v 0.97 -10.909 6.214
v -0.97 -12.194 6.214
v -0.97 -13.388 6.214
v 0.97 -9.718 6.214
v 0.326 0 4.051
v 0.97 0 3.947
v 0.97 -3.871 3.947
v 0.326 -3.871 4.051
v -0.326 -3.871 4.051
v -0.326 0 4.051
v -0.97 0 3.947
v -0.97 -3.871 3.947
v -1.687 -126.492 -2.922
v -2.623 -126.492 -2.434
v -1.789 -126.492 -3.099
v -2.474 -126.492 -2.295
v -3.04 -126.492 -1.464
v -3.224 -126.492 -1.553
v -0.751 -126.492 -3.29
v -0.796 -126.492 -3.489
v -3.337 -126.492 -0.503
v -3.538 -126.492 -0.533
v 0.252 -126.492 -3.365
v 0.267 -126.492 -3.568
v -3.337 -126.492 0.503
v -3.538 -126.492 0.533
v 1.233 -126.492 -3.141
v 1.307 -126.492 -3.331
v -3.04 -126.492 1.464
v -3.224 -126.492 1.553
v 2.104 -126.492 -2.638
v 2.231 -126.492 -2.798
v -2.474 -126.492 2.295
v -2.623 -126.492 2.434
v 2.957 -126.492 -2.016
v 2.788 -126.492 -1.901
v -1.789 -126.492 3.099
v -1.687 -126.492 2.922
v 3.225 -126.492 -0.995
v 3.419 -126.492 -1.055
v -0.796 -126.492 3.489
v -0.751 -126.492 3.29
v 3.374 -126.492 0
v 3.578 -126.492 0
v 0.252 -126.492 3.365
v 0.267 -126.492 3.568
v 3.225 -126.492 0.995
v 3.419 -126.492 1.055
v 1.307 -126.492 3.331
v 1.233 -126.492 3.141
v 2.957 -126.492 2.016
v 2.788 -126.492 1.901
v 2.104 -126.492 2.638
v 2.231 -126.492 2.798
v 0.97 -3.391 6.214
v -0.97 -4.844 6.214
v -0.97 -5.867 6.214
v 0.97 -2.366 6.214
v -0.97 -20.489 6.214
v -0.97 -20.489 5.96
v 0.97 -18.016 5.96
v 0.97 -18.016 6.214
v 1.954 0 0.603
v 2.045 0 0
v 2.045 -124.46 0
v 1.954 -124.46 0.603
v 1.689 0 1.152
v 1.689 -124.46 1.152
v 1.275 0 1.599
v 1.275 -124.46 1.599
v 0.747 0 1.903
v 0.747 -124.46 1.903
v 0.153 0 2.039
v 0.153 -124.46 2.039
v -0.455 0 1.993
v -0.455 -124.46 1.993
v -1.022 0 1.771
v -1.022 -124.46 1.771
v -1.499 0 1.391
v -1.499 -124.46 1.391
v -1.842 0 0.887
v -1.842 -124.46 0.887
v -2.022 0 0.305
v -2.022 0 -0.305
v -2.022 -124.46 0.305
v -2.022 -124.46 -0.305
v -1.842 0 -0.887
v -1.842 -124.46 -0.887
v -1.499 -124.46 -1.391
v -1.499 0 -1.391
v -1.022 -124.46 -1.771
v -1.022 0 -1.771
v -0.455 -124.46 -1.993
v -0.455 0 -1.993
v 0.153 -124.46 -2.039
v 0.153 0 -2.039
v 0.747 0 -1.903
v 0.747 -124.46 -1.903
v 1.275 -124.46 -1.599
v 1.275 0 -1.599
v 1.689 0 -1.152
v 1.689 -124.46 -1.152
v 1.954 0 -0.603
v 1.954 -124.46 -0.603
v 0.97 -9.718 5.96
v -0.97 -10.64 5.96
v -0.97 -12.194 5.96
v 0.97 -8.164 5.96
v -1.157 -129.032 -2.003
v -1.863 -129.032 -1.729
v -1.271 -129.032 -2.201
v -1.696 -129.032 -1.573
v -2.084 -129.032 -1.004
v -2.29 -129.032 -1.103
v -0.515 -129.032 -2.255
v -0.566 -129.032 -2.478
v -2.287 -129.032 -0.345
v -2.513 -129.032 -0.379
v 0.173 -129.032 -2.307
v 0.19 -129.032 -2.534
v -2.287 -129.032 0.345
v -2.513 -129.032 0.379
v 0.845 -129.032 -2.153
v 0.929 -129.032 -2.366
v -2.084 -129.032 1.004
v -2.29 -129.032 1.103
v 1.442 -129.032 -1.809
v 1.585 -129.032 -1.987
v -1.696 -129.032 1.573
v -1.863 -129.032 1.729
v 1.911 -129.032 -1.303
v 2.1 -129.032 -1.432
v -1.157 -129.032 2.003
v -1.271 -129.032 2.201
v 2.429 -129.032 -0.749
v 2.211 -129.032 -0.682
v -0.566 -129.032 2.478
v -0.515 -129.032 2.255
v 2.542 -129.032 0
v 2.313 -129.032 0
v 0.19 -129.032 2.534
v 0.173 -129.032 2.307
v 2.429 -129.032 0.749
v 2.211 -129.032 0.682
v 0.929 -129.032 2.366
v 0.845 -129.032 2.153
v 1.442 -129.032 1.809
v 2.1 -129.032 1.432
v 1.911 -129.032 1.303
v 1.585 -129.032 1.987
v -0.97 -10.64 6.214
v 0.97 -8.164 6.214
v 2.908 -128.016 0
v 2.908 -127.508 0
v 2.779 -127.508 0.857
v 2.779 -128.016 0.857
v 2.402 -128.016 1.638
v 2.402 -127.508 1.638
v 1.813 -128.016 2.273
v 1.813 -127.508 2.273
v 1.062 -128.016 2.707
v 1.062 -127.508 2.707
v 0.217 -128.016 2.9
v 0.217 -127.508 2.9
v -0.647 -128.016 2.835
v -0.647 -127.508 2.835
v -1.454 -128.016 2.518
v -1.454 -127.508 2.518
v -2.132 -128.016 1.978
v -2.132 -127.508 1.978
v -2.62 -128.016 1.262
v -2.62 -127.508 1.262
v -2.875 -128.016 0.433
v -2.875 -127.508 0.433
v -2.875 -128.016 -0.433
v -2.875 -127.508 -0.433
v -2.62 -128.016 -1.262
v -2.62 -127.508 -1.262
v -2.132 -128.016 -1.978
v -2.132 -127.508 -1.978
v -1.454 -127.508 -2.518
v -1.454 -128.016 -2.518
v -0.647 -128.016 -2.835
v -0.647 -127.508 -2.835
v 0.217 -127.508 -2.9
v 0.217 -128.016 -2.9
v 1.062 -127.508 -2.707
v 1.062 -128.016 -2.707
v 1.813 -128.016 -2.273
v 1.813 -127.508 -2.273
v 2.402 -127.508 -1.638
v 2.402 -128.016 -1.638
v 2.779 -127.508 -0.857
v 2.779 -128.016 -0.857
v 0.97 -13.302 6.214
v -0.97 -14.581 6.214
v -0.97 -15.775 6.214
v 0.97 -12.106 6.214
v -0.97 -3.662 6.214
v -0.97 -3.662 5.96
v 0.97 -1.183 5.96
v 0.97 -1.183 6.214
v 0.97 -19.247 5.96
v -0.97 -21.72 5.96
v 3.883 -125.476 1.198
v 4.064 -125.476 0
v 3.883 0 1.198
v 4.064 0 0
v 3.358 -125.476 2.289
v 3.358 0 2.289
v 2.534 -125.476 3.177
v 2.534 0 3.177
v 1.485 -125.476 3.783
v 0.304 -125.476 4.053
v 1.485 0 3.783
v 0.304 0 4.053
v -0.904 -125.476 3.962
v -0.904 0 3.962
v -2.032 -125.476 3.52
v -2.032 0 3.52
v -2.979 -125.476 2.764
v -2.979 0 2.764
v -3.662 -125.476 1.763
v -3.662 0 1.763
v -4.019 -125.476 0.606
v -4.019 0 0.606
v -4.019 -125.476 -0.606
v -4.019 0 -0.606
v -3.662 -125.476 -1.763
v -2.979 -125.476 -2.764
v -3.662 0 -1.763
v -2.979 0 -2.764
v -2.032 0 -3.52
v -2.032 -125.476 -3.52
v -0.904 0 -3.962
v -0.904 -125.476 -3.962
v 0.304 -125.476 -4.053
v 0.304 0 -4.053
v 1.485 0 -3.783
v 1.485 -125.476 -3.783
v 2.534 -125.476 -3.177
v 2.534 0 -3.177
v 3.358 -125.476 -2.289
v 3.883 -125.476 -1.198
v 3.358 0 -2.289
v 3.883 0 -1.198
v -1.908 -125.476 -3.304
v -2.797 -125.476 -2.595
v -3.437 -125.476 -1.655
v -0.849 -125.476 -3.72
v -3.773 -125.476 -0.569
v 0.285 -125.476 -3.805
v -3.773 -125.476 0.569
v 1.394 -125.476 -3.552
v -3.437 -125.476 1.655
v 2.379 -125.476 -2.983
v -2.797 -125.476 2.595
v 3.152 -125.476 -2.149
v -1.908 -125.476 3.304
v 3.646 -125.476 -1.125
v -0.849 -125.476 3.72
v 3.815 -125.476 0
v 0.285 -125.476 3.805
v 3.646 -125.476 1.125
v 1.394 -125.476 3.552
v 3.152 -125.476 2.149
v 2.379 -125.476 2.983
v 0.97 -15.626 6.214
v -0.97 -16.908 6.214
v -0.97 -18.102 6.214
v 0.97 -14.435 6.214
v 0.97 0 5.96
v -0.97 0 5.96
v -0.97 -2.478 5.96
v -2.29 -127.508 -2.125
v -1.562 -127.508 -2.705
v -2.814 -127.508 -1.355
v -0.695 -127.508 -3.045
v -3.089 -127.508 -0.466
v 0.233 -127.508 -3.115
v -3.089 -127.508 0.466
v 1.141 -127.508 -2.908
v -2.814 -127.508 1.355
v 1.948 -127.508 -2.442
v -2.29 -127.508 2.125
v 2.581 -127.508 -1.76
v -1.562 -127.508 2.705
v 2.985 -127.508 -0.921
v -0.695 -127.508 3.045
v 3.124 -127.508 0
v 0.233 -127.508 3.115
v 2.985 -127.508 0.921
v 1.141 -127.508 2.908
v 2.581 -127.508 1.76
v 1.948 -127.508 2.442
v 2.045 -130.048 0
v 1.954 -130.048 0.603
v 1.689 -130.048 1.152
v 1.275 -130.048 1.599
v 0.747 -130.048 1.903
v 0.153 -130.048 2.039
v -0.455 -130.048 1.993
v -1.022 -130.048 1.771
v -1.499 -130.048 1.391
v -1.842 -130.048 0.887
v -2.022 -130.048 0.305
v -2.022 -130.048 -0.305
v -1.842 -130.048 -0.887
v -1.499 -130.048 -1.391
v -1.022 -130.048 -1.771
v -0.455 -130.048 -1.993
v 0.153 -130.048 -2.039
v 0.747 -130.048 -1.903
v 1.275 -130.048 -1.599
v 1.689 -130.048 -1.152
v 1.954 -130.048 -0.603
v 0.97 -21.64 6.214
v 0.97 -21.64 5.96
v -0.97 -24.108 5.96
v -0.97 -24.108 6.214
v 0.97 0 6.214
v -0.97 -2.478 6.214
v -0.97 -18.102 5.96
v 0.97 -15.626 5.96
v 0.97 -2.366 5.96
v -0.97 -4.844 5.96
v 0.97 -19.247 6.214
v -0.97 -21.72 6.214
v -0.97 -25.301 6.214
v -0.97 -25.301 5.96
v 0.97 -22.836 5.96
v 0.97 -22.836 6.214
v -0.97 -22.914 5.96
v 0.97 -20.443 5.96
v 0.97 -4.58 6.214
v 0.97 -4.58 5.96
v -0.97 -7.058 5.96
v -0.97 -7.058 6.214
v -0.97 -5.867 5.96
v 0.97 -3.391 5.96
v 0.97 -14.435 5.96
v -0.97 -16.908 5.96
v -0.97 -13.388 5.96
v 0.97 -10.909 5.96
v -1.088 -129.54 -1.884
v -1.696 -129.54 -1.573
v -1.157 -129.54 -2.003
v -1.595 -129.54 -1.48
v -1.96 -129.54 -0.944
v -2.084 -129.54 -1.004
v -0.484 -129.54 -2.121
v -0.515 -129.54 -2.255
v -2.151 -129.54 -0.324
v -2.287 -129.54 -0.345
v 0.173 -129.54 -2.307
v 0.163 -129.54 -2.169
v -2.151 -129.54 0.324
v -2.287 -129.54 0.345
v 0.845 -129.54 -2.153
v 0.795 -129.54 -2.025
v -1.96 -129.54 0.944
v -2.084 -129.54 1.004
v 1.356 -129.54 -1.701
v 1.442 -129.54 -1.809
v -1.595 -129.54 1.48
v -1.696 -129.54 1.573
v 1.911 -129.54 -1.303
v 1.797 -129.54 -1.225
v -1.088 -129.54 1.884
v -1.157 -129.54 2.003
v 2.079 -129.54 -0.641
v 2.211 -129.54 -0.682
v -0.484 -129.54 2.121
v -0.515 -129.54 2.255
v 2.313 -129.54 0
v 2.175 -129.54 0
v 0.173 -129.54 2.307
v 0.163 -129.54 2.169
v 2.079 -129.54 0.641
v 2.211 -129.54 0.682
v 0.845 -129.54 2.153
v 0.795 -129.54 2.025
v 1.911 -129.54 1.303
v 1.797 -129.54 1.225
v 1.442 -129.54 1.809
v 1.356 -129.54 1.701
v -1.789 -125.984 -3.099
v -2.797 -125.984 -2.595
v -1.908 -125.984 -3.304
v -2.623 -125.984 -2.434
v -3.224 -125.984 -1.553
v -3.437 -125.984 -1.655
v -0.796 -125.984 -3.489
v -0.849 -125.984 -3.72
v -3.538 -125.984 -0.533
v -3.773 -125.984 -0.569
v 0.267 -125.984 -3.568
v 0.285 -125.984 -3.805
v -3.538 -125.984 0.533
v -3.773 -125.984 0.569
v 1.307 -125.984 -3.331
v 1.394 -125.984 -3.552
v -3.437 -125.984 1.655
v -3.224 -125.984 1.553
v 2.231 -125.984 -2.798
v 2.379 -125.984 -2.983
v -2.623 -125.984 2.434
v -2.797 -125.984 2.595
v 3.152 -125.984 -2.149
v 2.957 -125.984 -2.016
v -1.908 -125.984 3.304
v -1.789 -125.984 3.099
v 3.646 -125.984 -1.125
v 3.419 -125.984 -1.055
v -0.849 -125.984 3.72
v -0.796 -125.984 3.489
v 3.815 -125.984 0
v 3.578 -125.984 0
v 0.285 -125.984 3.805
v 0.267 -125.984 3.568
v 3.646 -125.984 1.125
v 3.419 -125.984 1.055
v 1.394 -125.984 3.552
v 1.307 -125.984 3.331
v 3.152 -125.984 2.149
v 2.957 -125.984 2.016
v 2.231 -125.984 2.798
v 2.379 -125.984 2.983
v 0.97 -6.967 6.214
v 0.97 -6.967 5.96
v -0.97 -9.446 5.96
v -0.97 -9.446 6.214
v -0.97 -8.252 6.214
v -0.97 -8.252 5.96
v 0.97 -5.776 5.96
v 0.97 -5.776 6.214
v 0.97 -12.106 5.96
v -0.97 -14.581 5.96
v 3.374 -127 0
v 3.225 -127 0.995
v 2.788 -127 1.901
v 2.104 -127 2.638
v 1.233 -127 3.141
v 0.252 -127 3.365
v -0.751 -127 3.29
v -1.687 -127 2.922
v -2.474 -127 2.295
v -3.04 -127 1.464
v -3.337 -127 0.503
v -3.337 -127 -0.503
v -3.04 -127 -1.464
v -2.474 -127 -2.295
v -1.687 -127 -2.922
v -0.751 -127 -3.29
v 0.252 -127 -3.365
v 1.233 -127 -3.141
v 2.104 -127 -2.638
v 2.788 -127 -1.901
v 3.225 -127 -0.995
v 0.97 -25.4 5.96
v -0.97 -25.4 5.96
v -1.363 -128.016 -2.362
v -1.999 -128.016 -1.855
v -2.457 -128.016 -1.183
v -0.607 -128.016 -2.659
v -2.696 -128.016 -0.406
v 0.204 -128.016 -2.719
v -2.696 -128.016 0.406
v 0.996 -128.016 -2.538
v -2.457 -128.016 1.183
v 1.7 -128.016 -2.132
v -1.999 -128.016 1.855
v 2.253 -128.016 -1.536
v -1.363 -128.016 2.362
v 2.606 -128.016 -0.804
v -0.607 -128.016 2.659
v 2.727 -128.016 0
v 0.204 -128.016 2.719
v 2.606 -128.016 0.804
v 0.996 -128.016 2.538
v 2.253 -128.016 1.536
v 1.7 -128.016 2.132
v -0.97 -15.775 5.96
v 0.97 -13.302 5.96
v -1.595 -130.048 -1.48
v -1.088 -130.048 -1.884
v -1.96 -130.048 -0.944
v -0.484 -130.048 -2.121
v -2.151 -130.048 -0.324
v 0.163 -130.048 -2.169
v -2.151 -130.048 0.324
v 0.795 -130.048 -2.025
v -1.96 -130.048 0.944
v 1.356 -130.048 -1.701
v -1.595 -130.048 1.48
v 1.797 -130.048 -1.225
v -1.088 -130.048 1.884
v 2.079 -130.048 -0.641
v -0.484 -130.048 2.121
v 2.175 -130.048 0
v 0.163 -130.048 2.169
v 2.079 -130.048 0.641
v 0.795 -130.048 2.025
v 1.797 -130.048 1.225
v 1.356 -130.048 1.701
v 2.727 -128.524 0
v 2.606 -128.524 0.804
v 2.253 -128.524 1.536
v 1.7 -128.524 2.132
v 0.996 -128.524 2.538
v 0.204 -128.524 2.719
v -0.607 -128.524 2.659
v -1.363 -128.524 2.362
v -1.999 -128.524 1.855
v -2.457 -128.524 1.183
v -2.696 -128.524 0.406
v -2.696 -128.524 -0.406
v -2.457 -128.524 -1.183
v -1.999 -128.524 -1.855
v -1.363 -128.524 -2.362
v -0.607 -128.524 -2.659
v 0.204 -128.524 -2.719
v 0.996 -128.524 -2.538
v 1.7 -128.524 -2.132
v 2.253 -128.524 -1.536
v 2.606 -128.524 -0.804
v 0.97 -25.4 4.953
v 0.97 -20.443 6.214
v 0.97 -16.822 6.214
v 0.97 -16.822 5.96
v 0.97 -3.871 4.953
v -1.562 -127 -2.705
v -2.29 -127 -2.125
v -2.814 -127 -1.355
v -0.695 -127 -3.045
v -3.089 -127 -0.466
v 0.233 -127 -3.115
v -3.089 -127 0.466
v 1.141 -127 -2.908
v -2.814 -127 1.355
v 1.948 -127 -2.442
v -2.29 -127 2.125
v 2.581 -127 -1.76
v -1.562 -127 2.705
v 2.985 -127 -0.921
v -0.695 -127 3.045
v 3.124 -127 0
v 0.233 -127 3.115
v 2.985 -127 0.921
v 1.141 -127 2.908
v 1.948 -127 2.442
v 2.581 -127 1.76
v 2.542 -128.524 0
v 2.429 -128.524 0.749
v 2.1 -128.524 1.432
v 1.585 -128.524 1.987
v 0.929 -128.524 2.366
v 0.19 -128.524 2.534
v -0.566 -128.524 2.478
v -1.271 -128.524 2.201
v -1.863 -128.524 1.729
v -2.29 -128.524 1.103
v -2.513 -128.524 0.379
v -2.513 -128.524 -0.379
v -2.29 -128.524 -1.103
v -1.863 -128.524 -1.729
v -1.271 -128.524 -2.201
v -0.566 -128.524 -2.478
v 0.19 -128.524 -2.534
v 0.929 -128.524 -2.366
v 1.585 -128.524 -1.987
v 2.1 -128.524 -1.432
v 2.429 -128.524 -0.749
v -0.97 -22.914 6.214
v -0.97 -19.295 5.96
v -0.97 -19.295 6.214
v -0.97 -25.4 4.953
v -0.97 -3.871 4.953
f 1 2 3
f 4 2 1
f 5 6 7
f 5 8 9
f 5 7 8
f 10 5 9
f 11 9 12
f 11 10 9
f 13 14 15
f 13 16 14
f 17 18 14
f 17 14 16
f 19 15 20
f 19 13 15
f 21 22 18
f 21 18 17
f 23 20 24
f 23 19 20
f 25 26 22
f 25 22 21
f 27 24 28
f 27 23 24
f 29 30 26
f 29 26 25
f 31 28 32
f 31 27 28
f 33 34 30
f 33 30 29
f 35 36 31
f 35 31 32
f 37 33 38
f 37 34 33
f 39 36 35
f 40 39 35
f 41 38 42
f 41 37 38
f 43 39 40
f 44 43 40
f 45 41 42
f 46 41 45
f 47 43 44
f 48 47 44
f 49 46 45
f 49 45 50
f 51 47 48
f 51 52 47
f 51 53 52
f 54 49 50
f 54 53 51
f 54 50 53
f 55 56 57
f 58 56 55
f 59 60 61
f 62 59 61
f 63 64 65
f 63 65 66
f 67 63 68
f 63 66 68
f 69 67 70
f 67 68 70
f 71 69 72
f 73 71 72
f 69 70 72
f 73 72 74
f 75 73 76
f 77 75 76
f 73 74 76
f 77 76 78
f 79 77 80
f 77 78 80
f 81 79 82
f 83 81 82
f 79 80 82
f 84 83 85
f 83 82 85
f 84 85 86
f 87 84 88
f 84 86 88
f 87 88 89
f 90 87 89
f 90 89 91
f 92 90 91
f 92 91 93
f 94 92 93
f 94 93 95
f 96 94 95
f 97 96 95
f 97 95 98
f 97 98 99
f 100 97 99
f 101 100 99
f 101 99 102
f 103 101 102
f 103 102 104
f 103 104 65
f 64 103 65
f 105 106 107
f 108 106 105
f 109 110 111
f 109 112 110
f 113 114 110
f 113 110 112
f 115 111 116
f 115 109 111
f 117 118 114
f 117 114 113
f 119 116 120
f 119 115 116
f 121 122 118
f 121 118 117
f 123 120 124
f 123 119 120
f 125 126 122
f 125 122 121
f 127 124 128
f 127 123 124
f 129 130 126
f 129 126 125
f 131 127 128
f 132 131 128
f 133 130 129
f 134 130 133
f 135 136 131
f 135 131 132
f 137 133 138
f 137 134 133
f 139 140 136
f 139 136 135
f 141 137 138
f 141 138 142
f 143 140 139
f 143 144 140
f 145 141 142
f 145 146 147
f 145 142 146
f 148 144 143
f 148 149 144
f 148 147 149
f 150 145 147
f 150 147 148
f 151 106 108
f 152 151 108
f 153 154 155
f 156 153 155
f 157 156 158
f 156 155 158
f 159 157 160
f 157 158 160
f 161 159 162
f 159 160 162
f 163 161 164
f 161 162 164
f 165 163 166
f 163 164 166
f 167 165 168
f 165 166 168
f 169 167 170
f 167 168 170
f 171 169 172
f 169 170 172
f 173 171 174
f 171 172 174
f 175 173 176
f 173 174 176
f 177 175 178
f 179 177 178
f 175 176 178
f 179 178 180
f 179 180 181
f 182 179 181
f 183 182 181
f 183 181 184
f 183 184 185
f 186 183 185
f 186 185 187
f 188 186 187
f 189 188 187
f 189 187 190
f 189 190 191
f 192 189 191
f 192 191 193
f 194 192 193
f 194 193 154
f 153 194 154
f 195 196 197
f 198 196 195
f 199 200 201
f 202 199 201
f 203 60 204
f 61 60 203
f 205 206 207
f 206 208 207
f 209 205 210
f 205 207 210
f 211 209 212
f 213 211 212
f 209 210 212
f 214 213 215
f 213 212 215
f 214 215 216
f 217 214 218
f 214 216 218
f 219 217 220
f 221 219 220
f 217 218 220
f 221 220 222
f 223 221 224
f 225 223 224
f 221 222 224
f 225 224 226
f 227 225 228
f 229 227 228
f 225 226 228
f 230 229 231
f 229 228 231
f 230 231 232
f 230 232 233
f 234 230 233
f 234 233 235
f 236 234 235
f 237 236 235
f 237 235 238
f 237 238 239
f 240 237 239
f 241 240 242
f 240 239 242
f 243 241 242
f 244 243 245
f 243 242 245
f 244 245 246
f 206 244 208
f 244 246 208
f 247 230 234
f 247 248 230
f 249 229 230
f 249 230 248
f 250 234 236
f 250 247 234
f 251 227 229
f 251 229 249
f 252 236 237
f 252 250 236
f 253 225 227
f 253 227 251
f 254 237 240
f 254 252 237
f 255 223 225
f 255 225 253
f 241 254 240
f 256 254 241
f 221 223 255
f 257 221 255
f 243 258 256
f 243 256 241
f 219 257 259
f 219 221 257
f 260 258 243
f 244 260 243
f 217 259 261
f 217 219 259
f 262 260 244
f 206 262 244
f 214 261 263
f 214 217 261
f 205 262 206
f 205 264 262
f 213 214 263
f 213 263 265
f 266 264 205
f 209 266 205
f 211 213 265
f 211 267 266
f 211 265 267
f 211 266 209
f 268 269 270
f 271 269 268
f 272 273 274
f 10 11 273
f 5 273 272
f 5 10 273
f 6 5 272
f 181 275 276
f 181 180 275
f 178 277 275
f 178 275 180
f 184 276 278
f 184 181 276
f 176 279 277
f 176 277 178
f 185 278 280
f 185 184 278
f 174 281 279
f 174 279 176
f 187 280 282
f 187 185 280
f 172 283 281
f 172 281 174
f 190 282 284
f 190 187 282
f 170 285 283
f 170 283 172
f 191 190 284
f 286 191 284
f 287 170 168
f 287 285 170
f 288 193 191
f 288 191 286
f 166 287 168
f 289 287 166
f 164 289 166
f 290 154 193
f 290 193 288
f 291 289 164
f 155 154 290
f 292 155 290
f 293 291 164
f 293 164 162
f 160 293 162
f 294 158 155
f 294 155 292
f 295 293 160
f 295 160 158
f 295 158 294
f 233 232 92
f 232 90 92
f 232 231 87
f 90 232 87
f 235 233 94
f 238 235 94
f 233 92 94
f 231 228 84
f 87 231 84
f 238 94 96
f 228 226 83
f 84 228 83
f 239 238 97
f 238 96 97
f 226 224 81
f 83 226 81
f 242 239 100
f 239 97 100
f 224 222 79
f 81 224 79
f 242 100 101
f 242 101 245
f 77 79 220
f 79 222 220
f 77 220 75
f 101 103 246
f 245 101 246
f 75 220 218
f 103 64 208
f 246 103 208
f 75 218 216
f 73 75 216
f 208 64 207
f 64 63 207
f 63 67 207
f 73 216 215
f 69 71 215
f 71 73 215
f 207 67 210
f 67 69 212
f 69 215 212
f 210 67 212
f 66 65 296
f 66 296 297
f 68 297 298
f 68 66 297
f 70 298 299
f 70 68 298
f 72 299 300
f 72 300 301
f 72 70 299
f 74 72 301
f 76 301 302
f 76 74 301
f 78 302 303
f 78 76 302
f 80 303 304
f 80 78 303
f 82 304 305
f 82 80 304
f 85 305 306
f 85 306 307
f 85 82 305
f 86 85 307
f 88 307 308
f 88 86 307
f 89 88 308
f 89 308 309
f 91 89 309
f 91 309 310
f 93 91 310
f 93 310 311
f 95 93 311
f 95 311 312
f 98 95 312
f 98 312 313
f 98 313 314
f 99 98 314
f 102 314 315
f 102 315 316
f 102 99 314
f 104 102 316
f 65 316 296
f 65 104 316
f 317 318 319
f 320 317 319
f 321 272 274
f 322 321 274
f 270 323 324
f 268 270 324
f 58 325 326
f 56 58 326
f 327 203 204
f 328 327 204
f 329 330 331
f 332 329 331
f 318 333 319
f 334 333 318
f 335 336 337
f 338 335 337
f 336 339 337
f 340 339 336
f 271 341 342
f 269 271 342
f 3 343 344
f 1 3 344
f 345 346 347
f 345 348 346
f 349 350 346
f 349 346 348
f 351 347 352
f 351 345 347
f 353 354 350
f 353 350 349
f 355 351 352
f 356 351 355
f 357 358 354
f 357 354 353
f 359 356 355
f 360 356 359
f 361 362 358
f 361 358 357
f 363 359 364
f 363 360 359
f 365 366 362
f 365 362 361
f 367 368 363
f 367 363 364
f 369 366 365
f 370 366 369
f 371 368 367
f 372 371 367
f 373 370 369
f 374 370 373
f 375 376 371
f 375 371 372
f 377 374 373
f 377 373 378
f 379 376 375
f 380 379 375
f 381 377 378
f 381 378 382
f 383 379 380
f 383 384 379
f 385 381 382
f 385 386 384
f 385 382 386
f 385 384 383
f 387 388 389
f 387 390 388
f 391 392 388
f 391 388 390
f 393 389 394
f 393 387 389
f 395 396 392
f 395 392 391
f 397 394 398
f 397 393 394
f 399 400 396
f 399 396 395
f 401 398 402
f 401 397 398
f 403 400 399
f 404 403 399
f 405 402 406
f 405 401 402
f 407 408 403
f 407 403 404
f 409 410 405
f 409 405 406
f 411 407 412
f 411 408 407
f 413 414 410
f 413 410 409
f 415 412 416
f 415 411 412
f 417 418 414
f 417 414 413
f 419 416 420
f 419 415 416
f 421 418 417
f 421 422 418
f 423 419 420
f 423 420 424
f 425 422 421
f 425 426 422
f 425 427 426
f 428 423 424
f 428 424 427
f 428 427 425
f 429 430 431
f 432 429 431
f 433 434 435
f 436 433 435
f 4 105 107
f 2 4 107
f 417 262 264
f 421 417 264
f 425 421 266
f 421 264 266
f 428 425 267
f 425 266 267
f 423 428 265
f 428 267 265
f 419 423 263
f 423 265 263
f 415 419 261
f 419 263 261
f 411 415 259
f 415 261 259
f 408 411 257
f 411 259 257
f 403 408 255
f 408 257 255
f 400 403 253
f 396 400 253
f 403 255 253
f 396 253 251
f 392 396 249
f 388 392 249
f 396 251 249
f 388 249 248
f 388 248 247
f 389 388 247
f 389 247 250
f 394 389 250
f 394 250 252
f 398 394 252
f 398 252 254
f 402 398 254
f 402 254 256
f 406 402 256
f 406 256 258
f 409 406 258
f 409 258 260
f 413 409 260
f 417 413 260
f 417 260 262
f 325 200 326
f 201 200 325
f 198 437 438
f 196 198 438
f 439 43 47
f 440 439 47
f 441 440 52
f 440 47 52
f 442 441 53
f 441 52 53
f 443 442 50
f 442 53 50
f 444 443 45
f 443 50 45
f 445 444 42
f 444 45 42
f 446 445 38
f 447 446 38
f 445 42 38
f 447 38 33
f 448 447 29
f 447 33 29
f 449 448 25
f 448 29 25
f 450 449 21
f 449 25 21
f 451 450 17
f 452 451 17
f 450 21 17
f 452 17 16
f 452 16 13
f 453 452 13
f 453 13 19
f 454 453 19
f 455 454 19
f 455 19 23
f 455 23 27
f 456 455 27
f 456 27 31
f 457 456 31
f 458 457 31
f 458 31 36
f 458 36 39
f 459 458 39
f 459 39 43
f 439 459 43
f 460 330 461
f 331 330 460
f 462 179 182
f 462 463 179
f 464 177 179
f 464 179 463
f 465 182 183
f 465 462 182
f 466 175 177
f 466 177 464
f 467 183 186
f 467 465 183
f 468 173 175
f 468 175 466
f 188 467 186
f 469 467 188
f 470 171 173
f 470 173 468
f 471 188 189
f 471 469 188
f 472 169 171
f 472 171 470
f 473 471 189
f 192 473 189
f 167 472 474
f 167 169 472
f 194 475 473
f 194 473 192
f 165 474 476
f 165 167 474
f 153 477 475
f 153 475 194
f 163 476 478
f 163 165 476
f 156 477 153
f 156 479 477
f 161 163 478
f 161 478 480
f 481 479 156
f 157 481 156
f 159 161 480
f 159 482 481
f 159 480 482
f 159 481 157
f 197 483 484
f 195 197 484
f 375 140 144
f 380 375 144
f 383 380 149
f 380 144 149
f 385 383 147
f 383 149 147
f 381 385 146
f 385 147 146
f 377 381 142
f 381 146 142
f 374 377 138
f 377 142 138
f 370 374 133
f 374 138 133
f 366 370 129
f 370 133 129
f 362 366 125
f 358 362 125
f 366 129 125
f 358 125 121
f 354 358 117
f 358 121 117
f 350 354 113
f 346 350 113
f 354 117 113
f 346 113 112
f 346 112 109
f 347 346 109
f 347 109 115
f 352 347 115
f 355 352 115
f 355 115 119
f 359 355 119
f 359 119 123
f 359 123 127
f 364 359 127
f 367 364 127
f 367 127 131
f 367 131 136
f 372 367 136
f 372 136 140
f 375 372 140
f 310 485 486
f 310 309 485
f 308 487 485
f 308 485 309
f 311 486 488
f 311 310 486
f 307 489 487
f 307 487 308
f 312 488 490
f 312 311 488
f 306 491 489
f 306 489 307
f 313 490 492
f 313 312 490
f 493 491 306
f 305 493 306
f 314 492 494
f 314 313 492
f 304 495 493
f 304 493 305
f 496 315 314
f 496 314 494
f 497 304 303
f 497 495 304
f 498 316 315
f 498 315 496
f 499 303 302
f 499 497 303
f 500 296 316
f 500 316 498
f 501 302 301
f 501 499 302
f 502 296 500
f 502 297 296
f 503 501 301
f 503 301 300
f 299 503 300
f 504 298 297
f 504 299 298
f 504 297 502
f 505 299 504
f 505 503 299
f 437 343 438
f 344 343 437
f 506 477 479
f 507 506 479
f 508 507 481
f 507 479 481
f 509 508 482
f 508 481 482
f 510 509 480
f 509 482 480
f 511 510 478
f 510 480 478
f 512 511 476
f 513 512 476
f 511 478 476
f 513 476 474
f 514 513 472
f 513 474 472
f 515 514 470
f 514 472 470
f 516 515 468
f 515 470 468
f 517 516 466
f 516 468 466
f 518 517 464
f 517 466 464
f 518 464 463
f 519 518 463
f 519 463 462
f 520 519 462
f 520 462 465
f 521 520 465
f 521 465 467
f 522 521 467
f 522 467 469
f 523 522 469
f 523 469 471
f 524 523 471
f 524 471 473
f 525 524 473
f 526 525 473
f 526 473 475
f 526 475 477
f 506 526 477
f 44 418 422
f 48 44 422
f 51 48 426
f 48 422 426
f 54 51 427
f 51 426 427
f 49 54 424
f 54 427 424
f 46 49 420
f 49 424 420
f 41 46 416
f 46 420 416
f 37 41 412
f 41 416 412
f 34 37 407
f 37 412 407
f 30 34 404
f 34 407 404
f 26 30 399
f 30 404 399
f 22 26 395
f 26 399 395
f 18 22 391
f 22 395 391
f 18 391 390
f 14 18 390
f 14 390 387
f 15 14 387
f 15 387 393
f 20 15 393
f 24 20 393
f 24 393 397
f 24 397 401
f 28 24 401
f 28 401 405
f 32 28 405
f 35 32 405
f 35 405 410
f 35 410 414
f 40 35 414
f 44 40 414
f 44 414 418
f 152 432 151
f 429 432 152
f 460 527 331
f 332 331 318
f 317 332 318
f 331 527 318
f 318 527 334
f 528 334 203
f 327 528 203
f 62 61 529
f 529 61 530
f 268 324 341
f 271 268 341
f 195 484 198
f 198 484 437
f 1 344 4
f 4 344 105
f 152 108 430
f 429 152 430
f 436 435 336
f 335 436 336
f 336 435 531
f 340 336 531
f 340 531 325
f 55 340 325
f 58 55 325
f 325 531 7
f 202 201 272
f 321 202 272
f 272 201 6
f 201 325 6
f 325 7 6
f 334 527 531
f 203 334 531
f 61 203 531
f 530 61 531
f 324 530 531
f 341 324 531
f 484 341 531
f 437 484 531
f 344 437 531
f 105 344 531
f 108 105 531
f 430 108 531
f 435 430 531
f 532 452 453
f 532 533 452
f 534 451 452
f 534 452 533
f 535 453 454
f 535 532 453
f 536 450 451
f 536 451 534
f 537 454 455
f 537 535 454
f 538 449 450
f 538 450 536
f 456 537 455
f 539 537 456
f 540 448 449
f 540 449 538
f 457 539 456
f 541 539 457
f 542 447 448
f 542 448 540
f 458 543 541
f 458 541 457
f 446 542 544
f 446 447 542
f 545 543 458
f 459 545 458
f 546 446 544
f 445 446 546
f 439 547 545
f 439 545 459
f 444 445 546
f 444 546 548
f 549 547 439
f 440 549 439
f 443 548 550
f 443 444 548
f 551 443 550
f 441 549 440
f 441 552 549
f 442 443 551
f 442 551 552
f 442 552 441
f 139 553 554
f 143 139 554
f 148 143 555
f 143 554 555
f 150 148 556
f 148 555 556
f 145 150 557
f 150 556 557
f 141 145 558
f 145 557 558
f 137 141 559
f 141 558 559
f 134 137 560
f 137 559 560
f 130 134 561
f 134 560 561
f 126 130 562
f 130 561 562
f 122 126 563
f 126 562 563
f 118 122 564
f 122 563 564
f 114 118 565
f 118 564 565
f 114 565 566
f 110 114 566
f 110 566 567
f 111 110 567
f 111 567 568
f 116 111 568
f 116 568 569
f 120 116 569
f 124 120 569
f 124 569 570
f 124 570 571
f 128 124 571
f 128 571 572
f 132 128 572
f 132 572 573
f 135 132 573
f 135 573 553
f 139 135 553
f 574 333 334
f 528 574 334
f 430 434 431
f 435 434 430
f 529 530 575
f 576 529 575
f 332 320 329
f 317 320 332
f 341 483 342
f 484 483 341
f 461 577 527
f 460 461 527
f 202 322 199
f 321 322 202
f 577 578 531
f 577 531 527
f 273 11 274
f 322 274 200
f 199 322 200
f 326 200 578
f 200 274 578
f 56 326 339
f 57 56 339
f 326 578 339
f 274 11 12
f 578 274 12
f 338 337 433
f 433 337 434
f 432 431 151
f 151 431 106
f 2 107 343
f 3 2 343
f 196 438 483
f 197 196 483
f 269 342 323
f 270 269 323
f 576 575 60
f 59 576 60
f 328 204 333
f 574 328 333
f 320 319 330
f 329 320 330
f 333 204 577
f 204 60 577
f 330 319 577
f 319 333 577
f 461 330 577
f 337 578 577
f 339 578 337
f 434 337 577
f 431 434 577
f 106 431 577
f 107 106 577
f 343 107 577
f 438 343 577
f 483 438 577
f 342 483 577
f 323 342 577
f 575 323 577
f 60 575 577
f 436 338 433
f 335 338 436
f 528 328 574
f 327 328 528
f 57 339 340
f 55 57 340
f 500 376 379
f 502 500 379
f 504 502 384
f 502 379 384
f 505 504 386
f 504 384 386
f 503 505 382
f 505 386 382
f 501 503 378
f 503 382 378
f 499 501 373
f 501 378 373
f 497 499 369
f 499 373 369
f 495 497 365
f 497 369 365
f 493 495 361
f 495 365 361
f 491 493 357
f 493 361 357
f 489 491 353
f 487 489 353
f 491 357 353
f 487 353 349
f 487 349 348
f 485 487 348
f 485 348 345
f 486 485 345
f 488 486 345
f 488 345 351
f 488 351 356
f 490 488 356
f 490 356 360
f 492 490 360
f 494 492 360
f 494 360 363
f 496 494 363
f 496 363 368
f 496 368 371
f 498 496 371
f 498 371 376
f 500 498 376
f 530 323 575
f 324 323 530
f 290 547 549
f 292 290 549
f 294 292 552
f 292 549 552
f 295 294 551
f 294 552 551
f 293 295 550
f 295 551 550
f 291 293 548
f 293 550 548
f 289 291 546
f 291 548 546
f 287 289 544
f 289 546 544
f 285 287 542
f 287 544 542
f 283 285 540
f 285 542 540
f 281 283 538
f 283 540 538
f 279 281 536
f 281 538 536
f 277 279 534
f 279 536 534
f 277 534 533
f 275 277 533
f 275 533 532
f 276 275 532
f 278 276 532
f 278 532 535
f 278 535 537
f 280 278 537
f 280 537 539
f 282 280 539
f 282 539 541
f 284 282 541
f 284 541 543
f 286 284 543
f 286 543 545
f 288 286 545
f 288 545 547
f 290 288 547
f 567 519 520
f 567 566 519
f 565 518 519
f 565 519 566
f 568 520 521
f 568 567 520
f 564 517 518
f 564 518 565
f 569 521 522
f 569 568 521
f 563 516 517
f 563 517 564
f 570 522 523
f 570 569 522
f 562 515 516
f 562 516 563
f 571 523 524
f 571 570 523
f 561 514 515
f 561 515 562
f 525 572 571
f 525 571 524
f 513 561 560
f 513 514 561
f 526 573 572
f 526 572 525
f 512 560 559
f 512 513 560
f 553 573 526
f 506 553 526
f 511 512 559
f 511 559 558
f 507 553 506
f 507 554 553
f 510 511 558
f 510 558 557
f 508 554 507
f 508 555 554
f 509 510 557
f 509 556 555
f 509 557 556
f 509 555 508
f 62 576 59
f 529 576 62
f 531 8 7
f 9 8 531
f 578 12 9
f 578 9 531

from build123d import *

# Parameters (mm, degrees)
F0_R      = 4.064
F1_DEPTH  = 124.46
F2_R      = 2.0447
F3_DEPTH  = 124.461
F4_R      = 4.064
F4_R_2    = 3.8152332724
F5_DEPTH  = 1.016
F4_R_3    = 3.5783205967
F6_DEPTH  = 1.524
F4_R_4    = 3.374484348
F7_DEPTH  = 2.032
F4_R_5    = 3.1236204278
F8_DEPTH  = 2.54
F4_R_6    = 2.9077299751
F9_DEPTH  = 3.048
F4_R_7    = 2.7268965776
F10_DEPTH = 3.556
F4_R_8    = 2.5416004055
F11_DEPTH = 4.064
F4_R_9    = 2.3133155835
F12_DEPTH = 4.572
F4_R_10   = 2.1752144811
F13_DEPTH = 5.08
F14_DEPTH = 5.588
F16_DEPTH = 25.4
F17_DEPTH = 0.762
F18_W     = 21.5292948574
F18_H     = 1.006477682
F19_DEPTH = 25.4
F21_DEPTH = 0.254


with BuildPart() as f1:
    # F0 (on Front) → F1 (new body)
    with BuildSketch(Plane.XZ):
        Circle(F0_R)
    extrude(amount=F1_DEPTH)

    # F2 (on face) → F3 (cut, through all)
    with BuildSketch(Plane.XZ.offset(124.46)):
        Circle(F2_R)
    extrude(amount=-F3_DEPTH, mode=Mode.SUBTRACT)

    # F4 (on face) → F5 (join)
    with BuildSketch(Plane.XZ.offset(124.46)):
        Circle(F4_R)
        Circle(F4_R_2, mode=Mode.SUBTRACT)
    extrude(amount=F5_DEPTH)

    # F4 (on face) → F6 (join)
    with BuildSketch(Plane.XZ.offset(124.46)):
        Circle(F4_R_2)
        Circle(F4_R_3, mode=Mode.SUBTRACT)
    extrude(amount=F6_DEPTH)

    # F4 (on face) → F7 (join)
    with BuildSketch(Plane.XZ.offset(124.46)):
        Circle(F4_R_3)
        Circle(F4_R_4, mode=Mode.SUBTRACT)
    extrude(amount=F7_DEPTH)

    # F4 (on face) → F8 (join)
    with BuildSketch(Plane.XZ.offset(124.46)):
        Circle(F4_R_4)
        Circle(F4_R_5, mode=Mode.SUBTRACT)
    extrude(amount=F8_DEPTH)

    # F4 (on face) → F9 (join)
    with BuildSketch(Plane.XZ.offset(124.46)):
        Circle(F4_R_5)
        Circle(F4_R_6, mode=Mode.SUBTRACT)
    extrude(amount=F9_DEPTH)

    # F4 (on face) → F10 (join)
    with BuildSketch(Plane.XZ.offset(124.46)):
        Circle(F4_R_6)
        Circle(F4_R_7, mode=Mode.SUBTRACT)
    extrude(amount=F10_DEPTH)

    # F4 (on face) → F11 (join)
    with BuildSketch(Plane.XZ.offset(124.46)):
        Circle(F4_R_7)
        Circle(F4_R_8, mode=Mode.SUBTRACT)
    extrude(amount=F11_DEPTH)

    # F4 (on face) → F12 (join)
    with BuildSketch(Plane.XZ.offset(124.46)):
        Circle(F4_R_8)
        Circle(F4_R_9, mode=Mode.SUBTRACT)
    extrude(amount=F12_DEPTH)

    # F4 (on face) → F13 (join)
    with BuildSketch(Plane.XZ.offset(124.46)):
        Circle(F4_R_9)
        Circle(F4_R_10, mode=Mode.SUBTRACT)
    extrude(amount=F13_DEPTH)

    # F14 (add): a face of the model
    f14_faces = [f1.faces().sort_by_distance(p)[0] for p in [
        (-2.1136901247, -124.46, 0),
    ]]
    extrude(f14_faces, amount=F14_DEPTH)


with BuildPart() as f16:
    # F15 (on face) → F16 (new body)
    with BuildSketch(Plane(origin=(0, 0, 0), x_dir=(-1, 0, 0), z_dir=(0, 1, 0))):
        with BuildLine():
            Line((0.969581597, 3.9466450976), (0.969581597, 5.1976004615))
            Line((0.969581597, 5.1976004615), (-0.969581597, 5.1976004615))
            Line((-0.969581597, 5.1976004615), (-0.969581597, 3.9466450976))
            ThreePointArc((-0.969581597, 3.9466450976), (0, 4.064), (0.969581597, 3.9466450976))
        make_face()
    extrude(amount=-F16_DEPTH)

    # F17 (add): a face of the model
    f17_faces = [f16.faces().sort_by_distance(p)[0] for p in [
        (0, -12.7, 5.1976004615),
    ]]
    extrude(f17_faces, amount=F17_DEPTH)

    # F18 (on face) → F19 (cut)
    with BuildSketch(Plane(origin=(-0.969581597, 0, 0), x_dir=(0, -1, 0), z_dir=(-1, 0, 0))):
        with Locations((14.6353525713, 4.4498839386)):
            Rectangle(F18_W, F18_H)
    extrude(amount=-F19_DEPTH, mode=Mode.SUBTRACT)

    # F20 (on face) → F21 (join)
    with BuildSketch(Plane.XY.offset(5.9596004615)):
        Polygon((0.969581597, -1.1831490597), (0.969581597, 0), (-0.969581597, -2.478363727), (-0.969581597, -3.6615127867), align=None)
        Polygon((0.969581597, -3.3909106419), (0.969581597, -2.3661273203), (-0.969581597, -4.8444910473), (-0.969581597, -5.8667180324), align=None)
        Polygon((0.969581597, -5.7761992704), (0.969581597, -4.5798162299), (-0.969581597, -7.0581799569), (-0.969581597, -8.2519799569), align=None)
        Polygon((0.969581597, -8.1637992704), (0.969581597, -6.9674162299), (-0.969581597, -9.4457799569), (-0.969581597, -10.6395799569), align=None)
        Polygon((0.969581597, -10.9091831476), (0.969581597, -9.7179661881), (-0.969581597, -12.1937468746), (-0.969581597, -13.3875468746), align=None)
        Polygon((0.969581597, -13.3019458924), (0.969581597, -12.1055661881), (-0.969581597, -14.5813468746), (-0.969581597, -15.7751468746), align=None)
        Polygon((0.969581597, -15.6257336208), (0.969581597, -14.4345133251), (-0.969581597, -16.9077143073), (-0.969581597, -18.1015143073), align=None)
        Polygon((0.969581597, -18.0159133251), (0.969581597, -16.8221133251), (-0.969581597, -19.2953143073), (-0.969581597, -20.4891143073), align=None)
        Polygon((0.969581597, -20.4431303015), (0.969581597, -19.2467539257), (-0.969581597, -21.7199549079), (-0.969581597, -22.9137549079), align=None)
        Polygon((0.969581597, -22.8358730989), (0.969581597, -21.6395033567), (-0.969581597, -24.1075549079), (-0.969581597, -25.3013549079), align=None)
    extrude(amount=F21_DEPTH)


solid = Compound([f1.part, f16.part])
